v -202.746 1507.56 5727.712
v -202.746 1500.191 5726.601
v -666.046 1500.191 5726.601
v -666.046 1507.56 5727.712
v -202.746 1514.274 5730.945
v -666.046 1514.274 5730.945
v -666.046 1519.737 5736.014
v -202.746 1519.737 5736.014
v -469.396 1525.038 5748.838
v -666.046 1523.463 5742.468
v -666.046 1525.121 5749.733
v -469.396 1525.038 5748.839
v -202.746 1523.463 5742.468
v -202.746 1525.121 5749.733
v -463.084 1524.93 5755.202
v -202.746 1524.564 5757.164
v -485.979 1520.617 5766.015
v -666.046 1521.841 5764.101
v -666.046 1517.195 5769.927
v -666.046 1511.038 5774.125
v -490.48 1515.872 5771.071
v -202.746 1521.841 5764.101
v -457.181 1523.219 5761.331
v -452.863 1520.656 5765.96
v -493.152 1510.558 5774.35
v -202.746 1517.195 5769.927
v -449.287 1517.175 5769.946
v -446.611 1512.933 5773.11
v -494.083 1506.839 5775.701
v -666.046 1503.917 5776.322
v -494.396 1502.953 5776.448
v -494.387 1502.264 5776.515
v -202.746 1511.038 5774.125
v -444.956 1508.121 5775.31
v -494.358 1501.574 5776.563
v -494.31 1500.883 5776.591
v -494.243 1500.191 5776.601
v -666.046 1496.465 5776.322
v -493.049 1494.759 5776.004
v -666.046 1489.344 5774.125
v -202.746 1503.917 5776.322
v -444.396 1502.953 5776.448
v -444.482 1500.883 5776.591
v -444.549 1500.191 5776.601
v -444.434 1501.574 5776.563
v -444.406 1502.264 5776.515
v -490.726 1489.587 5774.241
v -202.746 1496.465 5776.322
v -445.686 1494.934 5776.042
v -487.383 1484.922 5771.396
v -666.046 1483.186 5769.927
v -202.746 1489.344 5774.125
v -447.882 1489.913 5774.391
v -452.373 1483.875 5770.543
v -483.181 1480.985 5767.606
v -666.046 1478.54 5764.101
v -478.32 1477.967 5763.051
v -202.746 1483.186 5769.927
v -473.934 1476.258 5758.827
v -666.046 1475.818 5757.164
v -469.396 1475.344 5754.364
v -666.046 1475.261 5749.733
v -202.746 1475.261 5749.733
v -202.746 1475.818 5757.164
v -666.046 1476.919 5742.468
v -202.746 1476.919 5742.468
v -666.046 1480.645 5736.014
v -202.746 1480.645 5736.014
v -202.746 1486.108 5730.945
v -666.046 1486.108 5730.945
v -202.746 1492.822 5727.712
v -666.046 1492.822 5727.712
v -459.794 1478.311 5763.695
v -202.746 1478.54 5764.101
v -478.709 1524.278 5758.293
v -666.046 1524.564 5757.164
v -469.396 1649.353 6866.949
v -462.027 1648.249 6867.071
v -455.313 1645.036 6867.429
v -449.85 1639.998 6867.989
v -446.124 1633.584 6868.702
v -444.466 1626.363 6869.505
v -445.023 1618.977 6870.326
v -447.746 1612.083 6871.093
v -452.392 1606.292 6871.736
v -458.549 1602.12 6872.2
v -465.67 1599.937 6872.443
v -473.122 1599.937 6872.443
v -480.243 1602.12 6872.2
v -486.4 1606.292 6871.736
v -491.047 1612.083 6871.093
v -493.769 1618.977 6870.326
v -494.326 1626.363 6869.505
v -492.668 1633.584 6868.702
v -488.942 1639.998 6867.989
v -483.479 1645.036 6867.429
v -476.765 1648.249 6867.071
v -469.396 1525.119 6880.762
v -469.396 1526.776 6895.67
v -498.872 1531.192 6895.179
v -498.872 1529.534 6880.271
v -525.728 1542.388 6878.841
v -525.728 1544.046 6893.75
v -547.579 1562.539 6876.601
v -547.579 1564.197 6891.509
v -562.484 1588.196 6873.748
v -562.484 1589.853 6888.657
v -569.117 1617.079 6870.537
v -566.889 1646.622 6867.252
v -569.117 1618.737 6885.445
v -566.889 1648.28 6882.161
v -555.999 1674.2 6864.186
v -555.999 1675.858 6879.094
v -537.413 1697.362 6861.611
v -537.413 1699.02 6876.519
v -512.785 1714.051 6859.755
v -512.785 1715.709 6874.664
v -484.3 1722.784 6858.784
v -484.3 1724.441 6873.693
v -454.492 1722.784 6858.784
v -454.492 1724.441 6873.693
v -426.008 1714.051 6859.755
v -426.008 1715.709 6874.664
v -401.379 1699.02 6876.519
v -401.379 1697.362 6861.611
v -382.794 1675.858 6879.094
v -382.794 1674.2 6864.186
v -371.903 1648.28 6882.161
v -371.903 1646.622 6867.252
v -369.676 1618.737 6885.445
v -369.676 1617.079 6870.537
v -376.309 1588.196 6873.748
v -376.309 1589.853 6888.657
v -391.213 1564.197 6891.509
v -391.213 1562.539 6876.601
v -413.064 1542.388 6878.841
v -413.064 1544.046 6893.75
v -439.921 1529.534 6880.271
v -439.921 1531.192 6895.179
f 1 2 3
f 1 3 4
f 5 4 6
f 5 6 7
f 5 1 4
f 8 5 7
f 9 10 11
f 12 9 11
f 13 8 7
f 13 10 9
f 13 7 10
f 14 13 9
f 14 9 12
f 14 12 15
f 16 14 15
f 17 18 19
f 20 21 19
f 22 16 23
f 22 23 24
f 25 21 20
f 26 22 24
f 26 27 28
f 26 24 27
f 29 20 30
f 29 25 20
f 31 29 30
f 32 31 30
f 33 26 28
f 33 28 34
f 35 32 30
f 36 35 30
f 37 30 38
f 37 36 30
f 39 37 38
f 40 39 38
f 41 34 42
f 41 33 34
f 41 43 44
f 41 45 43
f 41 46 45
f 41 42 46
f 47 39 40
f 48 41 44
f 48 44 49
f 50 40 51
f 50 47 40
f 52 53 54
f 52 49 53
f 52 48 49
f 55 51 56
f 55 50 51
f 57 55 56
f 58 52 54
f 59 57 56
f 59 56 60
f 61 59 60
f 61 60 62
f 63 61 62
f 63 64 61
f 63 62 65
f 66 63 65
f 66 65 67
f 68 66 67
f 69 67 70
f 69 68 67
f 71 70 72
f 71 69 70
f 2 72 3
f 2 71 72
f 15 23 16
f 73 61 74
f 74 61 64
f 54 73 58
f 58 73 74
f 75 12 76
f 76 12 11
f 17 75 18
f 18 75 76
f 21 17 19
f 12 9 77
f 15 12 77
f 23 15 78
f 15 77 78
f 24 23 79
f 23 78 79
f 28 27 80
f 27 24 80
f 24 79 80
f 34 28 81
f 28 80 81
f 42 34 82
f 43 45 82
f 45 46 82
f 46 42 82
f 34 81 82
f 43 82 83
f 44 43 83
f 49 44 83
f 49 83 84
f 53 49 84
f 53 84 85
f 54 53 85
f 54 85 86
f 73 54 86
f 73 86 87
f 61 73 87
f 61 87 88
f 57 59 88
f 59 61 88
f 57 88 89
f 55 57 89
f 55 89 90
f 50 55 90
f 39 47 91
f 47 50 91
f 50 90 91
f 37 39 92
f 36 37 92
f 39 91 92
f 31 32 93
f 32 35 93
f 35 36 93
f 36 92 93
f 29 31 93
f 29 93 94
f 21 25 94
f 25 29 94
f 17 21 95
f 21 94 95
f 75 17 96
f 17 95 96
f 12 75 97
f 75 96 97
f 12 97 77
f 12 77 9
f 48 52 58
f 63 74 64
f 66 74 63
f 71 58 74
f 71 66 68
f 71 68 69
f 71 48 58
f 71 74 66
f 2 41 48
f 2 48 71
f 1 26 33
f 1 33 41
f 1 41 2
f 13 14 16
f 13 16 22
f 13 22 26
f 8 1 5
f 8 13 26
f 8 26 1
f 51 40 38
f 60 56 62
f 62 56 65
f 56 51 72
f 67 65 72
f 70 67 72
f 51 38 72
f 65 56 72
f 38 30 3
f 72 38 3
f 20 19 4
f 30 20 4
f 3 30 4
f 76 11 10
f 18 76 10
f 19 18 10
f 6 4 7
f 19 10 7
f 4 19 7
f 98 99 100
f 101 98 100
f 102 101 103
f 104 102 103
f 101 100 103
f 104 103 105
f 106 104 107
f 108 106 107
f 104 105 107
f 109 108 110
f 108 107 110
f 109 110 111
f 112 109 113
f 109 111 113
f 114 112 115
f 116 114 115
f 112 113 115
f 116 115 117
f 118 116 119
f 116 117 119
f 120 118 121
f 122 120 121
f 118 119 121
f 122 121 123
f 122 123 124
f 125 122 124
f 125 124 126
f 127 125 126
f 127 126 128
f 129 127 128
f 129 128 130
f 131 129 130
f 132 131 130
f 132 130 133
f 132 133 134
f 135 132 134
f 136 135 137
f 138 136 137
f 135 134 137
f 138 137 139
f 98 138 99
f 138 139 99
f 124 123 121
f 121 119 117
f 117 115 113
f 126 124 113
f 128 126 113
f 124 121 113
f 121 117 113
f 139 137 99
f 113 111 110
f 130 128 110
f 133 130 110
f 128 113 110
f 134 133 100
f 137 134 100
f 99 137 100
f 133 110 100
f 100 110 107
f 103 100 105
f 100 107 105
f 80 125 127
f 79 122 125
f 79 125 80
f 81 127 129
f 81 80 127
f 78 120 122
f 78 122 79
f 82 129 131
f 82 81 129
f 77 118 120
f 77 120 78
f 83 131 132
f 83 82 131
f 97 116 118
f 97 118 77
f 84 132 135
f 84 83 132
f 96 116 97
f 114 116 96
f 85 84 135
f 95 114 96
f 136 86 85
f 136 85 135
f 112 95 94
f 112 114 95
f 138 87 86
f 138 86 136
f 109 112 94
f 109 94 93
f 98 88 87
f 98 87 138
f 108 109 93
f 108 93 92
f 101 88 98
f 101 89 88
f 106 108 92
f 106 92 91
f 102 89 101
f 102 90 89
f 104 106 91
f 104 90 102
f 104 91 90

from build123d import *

# Parameters (mm, degrees)
CROQUIS3_R                   = 25
SALIENTE_EXTRUIR1_DEPTH      = 463.3
CROQUIS5_R                   = 100
SALIENTE_EXTRUIR2_DEPTH      = 15
SALIENTE_EXTRUIR3_REACH      = 1699.123
SALIENTE_EXTRUIR3_END_RADIUS = 25
CROQUIS6_R                   = 25


with BuildPart() as part:
    # Croquis3 → Saliente-Extruir1 (new body)
    with BuildSketch(Plane(origin=(-202.746163562, 0, 0), x_dir=(0, 0, -1), z_dir=(1, 0, 0))):
        with Locations((-5751.601025747, 1500.190716107)):
            Circle(CROQUIS3_R)
    extrude(amount=-SALIENTE_EXTRUIR1_DEPTH)



with BuildPart() as body_2:
    # Croquis5 → Saliente-Extruir2 (new body)
    with BuildSketch(Plane(origin=(0, 775.966680828, 6979.147433935), x_dir=(1, 0, 0), z_dir=(0, -0.11050268429861657, -0.9938758256255157))):
        with Locations(Location((-469.396163562, -855.435934207, 0), (0, 0, 90))):
            Circle(CROQUIS5_R)
    extrude(amount=SALIENTE_EXTRUIR2_DEPTH)


with BuildPart() as part_1:
    add(part.part)

    add(body_2.part)  # Saliente-Extruir3 merges body 2
    # Saliente-Extruir3: up to this cylinder (the profile starts outside it)
    saliente_extruir3_end = Plane(origin=(-469.396164, 1500.190716107, 5751.601025747), z_dir=(1, 0, 0)) * Cylinder(SALIENTE_EXTRUIR3_END_RADIUS, 3449.246, mode=Mode.PRIVATE)
    # Croquis6 → Saliente-Extruir3 (add, up to the surface)
    with BuildSketch(Plane(origin=(0, 774.309140563, 6964.239296551), x_dir=(1, 0, 0), z_dir=(0, -0.11050268429861657, -0.9938758256255156)), mode=Mode.PRIVATE) as saliente_extruir3_sk1:
        with Locations(Location((-469.396163562, -855.435934207, 0), (0, 0, 270))):
            Circle(CROQUIS6_R)
    saliente_extruir3_tool1 = extrude(saliente_extruir3_sk1.sketch, amount=SALIENTE_EXTRUIR3_REACH, mode=Mode.PRIVATE) - saliente_extruir3_end
    add(saliente_extruir3_tool1.solids().sort_by_distance((-469.396164, 1624.506236, 6869.71133))[0])


solid = part_1.part
